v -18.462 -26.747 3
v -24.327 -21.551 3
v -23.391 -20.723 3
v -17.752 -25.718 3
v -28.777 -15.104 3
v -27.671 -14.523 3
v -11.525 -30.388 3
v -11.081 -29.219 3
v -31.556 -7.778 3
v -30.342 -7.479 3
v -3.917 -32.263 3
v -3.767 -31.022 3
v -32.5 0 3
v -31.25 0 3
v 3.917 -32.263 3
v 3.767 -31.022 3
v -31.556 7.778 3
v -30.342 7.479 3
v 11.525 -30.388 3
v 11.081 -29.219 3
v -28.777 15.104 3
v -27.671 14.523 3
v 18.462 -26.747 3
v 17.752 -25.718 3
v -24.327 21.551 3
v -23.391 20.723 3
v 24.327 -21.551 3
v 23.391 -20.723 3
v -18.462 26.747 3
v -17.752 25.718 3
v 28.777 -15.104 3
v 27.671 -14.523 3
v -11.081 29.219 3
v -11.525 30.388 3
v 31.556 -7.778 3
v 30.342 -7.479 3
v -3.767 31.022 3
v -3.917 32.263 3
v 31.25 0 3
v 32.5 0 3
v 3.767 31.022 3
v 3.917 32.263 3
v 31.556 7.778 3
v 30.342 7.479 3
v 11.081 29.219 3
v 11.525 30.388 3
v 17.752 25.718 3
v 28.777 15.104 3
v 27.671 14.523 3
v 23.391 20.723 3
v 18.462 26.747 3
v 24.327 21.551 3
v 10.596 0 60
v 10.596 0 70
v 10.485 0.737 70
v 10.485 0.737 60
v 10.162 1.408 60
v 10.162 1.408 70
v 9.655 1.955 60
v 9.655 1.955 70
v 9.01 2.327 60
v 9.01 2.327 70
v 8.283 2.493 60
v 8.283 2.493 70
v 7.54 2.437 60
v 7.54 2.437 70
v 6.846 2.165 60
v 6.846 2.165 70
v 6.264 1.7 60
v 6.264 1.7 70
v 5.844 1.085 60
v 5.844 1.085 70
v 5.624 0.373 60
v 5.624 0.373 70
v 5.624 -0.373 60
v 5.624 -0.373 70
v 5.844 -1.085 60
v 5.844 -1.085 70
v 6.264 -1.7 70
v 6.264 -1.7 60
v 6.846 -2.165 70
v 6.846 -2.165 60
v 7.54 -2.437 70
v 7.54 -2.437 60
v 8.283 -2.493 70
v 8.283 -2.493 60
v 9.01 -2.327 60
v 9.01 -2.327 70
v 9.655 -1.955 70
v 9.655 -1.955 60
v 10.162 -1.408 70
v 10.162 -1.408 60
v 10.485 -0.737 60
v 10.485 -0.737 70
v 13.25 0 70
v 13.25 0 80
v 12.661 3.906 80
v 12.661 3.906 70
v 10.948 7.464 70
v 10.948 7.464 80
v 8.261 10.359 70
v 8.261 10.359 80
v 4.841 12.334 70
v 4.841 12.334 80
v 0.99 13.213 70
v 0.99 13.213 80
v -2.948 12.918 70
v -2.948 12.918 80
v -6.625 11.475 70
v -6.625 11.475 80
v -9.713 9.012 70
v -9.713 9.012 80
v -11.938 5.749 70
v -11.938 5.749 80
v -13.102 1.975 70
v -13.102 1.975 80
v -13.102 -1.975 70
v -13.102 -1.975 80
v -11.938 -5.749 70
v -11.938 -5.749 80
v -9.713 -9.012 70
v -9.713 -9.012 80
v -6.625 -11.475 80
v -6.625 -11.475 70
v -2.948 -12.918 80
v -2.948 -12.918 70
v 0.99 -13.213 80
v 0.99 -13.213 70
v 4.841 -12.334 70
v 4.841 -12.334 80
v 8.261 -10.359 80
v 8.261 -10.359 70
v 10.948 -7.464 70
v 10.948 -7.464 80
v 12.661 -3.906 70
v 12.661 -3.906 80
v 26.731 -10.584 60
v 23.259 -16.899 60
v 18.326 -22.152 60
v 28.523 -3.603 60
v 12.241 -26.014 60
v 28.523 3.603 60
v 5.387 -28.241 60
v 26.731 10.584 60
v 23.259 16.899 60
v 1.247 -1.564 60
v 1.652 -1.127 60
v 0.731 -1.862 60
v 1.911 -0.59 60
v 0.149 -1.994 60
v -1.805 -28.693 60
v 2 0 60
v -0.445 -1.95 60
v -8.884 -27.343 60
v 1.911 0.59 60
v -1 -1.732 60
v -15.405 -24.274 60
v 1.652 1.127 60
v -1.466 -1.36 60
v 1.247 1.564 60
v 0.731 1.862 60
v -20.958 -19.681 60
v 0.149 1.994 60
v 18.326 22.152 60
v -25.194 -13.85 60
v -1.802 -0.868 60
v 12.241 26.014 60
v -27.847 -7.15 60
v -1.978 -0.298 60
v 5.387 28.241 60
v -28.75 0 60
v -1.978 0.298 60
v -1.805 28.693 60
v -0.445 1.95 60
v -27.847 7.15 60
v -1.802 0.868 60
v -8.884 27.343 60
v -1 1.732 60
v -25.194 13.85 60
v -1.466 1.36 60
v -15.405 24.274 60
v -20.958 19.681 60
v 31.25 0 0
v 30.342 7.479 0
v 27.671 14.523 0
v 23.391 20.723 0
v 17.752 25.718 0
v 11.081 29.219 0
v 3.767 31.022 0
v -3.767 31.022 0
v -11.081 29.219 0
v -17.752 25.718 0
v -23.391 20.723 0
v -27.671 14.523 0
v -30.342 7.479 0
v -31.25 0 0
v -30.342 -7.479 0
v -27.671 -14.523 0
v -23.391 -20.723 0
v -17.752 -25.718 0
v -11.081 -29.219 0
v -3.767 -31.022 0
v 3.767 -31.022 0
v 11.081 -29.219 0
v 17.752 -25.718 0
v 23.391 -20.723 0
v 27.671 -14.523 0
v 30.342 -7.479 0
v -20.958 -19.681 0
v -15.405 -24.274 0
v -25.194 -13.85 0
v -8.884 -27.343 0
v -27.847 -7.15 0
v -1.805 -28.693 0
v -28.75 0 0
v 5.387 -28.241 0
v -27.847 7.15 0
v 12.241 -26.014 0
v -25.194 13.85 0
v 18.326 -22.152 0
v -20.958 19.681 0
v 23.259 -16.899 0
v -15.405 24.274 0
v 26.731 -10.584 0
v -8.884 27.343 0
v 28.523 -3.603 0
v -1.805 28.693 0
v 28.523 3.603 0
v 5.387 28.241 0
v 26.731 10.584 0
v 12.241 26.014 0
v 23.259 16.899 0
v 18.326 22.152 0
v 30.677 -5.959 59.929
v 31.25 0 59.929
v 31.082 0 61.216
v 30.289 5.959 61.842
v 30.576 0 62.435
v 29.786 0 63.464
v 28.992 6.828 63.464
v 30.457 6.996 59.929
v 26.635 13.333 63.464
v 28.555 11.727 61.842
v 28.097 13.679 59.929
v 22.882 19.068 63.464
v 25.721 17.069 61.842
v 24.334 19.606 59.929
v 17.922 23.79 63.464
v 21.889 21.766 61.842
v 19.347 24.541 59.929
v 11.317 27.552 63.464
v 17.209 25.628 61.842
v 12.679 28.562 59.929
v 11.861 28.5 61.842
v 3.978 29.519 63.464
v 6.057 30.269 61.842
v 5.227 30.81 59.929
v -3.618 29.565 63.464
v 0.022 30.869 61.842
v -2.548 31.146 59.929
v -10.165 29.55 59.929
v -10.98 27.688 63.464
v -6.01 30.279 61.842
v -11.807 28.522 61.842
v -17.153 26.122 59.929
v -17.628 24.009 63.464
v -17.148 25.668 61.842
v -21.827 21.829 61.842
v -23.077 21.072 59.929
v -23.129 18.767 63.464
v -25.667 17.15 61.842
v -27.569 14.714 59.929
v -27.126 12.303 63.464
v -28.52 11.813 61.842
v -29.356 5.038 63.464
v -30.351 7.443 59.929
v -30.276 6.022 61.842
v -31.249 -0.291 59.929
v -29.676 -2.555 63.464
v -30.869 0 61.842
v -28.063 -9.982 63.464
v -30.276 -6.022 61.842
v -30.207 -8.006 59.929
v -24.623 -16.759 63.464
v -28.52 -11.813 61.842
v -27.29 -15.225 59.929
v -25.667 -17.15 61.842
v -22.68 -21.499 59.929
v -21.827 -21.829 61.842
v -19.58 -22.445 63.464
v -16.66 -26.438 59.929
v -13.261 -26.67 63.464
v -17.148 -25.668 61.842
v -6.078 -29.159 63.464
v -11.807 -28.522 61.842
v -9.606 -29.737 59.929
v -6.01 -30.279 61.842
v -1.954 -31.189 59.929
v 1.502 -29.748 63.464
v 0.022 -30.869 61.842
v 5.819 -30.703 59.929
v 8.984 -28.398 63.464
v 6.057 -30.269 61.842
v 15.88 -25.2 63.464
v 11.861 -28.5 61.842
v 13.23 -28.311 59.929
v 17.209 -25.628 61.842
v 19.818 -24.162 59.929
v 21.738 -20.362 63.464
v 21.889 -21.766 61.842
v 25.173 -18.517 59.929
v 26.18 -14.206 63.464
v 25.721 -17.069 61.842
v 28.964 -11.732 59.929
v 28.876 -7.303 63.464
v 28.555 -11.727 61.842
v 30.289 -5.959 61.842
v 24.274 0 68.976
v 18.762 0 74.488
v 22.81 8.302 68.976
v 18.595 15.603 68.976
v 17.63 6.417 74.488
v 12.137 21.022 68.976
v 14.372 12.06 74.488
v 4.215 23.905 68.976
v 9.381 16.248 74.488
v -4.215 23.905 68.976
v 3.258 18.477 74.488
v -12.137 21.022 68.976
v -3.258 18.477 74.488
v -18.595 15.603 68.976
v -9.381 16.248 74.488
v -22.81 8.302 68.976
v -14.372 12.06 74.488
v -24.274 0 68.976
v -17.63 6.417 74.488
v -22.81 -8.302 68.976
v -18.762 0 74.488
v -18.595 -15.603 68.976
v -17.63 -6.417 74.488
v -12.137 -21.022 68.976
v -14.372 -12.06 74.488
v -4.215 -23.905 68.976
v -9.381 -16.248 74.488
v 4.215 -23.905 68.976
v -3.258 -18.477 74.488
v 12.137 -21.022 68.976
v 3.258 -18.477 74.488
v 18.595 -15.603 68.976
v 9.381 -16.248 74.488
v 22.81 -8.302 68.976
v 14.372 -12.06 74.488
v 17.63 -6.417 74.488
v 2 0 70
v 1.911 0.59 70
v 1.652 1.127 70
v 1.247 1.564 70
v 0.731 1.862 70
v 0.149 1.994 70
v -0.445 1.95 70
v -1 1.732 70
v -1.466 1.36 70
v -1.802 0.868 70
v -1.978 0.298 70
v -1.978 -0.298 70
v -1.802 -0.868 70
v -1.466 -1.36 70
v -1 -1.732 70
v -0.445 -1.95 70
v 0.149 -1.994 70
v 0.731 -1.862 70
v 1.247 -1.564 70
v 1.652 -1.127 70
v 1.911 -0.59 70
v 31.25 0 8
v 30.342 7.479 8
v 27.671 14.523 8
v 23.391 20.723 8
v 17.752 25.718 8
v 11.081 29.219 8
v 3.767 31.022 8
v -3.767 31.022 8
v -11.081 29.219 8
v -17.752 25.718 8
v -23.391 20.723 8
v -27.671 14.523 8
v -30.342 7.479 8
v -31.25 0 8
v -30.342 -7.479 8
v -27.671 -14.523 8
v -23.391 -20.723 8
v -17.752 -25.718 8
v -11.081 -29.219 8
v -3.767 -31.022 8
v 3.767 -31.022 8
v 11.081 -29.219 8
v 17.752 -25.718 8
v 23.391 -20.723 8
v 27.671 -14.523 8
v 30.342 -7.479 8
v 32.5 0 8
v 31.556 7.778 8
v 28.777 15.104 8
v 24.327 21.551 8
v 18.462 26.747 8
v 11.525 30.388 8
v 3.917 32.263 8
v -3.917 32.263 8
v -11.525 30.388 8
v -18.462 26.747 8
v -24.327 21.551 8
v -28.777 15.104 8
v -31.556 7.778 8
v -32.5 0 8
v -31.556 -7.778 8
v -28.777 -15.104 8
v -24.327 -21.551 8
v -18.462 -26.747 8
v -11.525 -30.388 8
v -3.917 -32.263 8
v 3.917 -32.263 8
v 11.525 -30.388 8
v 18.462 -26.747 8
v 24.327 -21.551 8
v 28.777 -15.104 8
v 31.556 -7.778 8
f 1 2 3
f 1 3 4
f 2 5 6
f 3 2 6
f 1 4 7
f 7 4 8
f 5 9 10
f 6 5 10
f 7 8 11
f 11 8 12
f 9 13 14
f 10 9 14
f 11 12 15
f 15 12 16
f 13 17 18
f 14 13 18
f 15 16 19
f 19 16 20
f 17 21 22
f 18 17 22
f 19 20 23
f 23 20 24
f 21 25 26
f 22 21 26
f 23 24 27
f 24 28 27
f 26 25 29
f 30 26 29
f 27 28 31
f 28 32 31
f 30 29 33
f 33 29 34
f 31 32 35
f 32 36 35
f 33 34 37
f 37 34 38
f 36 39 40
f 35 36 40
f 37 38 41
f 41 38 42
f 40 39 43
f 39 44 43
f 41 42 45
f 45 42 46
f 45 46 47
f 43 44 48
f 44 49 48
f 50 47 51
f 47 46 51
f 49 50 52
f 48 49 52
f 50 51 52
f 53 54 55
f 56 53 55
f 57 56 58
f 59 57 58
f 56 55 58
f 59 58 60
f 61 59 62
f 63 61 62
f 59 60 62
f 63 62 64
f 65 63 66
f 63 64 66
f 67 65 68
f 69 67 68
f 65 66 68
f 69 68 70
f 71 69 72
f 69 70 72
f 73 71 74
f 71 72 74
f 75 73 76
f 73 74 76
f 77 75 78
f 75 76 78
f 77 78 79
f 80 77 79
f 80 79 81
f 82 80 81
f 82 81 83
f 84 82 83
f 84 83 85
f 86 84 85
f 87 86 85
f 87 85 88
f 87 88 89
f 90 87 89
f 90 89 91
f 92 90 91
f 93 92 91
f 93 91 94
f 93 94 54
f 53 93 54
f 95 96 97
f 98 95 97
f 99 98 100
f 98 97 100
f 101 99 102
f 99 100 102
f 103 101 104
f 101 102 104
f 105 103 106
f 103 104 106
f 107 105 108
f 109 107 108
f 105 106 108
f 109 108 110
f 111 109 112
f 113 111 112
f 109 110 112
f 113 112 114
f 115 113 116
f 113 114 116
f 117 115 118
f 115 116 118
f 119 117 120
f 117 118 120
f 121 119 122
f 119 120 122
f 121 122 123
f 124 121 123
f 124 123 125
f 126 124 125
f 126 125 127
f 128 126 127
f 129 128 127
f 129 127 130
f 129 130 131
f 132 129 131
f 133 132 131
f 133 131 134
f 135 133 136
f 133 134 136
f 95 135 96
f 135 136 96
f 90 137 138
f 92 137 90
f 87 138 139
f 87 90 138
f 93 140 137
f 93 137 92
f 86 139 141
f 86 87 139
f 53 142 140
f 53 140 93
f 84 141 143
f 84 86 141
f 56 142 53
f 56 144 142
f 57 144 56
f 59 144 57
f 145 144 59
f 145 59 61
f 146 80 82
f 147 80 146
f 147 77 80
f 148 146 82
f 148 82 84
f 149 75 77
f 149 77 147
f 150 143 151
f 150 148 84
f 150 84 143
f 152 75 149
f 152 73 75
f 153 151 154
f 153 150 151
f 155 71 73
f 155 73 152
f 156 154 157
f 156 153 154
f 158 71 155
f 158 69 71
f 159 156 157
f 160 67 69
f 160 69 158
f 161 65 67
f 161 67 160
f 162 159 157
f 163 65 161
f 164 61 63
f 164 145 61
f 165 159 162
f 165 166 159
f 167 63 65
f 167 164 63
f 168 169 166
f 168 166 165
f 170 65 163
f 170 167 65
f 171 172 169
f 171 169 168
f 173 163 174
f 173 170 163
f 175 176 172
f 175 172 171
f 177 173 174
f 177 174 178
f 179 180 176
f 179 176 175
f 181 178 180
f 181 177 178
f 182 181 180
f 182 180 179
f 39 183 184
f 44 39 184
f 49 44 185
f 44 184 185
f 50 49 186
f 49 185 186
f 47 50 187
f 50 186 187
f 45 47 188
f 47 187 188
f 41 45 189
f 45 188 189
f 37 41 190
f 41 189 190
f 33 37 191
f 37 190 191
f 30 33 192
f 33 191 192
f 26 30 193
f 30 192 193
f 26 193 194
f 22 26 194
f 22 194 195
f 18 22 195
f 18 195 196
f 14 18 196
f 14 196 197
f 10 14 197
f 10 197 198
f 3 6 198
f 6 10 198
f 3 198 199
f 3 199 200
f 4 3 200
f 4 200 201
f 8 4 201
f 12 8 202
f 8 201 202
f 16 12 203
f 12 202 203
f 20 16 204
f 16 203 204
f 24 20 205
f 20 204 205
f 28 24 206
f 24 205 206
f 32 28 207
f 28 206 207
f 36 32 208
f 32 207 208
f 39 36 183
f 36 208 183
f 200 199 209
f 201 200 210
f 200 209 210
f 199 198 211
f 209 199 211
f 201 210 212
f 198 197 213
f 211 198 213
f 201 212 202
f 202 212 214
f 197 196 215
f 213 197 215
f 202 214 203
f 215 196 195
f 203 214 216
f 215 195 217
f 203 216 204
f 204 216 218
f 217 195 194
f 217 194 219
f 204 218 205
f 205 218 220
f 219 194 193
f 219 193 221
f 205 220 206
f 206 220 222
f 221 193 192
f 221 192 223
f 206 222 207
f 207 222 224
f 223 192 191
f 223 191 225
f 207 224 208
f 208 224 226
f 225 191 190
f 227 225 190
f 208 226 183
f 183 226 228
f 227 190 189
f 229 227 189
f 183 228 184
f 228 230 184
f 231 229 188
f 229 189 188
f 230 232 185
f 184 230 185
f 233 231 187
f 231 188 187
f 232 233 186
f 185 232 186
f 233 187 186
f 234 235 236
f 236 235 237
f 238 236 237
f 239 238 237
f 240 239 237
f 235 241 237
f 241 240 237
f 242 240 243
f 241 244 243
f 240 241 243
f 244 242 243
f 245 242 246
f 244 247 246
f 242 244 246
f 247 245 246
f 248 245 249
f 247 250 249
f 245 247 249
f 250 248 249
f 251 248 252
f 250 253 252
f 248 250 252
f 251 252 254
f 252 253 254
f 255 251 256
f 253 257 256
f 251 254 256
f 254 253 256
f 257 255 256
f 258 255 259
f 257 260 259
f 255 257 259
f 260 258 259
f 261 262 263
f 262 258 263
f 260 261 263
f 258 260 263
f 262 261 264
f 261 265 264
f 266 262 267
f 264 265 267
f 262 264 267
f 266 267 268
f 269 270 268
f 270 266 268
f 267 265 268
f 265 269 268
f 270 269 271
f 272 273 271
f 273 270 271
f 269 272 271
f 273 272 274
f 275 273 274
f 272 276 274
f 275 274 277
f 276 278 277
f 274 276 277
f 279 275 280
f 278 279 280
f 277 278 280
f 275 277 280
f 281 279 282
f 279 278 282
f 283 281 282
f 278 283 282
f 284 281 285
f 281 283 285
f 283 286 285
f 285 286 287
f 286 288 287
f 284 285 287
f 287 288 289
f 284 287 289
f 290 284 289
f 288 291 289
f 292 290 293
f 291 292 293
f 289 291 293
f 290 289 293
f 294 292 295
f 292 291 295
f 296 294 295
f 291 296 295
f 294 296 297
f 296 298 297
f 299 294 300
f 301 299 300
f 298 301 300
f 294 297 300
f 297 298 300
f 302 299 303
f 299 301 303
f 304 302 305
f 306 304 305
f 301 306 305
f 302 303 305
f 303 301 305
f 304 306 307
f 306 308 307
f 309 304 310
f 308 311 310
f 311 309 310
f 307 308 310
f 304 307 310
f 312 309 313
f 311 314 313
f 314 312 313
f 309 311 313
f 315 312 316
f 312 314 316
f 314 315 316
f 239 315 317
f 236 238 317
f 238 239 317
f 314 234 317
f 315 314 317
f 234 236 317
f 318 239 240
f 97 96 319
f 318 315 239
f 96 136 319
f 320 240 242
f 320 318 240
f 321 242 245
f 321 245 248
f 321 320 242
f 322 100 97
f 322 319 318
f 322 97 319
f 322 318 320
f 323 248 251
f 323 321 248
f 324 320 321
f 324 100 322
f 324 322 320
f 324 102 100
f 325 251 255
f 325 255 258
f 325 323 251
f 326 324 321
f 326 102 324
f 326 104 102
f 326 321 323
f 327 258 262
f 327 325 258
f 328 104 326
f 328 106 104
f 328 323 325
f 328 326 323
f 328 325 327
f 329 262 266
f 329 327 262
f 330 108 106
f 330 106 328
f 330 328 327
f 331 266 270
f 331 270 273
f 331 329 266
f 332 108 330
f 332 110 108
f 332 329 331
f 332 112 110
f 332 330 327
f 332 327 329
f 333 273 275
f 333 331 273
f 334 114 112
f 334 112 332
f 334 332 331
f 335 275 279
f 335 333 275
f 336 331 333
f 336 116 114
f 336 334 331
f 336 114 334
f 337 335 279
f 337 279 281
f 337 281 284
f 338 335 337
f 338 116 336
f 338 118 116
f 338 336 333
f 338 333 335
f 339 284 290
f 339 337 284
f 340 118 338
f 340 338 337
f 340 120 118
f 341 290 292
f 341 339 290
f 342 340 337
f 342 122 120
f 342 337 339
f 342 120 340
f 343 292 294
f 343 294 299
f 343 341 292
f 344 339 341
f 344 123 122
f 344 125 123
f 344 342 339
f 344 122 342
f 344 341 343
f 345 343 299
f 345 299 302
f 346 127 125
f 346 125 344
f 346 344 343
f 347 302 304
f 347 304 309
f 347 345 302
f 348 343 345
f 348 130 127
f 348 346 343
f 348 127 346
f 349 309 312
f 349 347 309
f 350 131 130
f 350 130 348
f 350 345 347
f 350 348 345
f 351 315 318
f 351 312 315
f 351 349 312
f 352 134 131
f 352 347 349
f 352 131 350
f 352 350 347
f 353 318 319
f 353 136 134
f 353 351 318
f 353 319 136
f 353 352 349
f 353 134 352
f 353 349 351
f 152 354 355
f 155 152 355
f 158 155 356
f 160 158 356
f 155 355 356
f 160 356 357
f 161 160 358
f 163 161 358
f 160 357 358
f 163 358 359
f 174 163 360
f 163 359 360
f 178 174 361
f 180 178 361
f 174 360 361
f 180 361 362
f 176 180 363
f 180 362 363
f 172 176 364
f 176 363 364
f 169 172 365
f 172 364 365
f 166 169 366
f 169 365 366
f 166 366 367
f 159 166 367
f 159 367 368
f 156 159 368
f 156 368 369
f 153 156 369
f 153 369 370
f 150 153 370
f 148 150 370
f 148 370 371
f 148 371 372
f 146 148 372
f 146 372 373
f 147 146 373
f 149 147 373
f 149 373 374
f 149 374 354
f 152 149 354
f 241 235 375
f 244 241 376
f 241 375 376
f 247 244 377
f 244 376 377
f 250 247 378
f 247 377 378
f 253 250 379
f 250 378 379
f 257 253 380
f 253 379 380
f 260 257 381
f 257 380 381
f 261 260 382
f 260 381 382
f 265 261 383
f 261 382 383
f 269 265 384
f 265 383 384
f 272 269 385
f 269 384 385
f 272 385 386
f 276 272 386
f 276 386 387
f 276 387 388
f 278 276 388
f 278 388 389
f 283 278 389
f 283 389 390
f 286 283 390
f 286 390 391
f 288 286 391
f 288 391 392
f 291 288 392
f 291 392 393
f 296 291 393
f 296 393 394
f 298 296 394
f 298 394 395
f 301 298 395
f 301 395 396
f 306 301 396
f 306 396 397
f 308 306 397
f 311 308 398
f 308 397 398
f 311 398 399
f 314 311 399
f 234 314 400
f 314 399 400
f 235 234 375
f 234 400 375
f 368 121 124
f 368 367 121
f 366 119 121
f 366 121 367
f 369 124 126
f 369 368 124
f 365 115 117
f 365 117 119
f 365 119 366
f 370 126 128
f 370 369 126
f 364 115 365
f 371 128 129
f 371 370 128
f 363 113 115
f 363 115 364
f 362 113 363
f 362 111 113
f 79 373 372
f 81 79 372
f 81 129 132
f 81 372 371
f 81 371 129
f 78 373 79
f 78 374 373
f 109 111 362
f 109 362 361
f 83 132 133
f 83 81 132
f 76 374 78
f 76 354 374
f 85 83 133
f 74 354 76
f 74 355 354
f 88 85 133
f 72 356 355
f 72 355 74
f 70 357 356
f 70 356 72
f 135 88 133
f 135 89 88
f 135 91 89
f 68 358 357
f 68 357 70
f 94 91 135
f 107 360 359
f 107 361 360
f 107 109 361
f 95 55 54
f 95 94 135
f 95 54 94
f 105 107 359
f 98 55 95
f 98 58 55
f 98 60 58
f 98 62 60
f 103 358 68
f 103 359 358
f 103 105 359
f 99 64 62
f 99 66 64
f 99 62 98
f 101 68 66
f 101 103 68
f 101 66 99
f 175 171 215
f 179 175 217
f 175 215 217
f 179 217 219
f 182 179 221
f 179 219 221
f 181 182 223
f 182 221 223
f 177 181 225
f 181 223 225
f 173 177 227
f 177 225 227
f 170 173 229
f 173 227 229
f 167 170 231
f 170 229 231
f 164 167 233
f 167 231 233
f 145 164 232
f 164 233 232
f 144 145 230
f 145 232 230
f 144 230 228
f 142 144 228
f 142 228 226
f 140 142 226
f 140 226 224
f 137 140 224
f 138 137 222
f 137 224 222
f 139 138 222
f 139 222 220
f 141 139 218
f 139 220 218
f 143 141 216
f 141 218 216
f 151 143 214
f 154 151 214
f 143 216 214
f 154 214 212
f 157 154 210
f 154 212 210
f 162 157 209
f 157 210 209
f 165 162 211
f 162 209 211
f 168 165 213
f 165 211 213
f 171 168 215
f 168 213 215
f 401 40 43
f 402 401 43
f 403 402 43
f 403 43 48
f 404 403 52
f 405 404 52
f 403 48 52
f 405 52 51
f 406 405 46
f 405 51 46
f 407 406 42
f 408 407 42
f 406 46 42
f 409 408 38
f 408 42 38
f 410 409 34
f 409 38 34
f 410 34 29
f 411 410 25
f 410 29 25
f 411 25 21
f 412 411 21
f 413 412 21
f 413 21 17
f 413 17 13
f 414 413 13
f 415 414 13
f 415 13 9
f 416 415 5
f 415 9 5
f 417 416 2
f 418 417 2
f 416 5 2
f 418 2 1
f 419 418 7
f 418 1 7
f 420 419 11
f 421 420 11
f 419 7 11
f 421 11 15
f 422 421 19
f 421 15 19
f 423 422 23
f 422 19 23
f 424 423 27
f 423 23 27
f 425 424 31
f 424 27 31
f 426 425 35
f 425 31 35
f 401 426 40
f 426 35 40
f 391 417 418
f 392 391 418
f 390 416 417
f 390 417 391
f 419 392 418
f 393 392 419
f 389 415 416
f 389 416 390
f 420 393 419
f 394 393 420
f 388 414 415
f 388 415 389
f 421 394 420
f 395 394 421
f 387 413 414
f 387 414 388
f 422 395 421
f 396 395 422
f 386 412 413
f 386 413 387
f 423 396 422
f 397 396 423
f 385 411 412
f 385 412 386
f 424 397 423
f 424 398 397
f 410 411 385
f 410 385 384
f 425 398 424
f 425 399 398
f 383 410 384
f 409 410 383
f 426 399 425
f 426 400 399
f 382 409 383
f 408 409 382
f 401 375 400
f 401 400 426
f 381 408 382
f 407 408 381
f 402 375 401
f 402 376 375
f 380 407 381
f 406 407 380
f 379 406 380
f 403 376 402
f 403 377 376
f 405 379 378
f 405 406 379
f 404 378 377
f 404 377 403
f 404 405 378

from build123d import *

# Parameters (mm, degrees)
SKETCH1_R           = 31.25
BOSS_EXTRUDE1_DEPTH = 80
SKETCH2_R           = 32.5
BOSS_EXTRUDE2_DEPTH = 5
CHAMFER1_SIZE       = 18
FILLET2_R           = 5
SKETCH6_R           = 13.25
CUT_EXTRUDE3_DEPTH  = 10
SKETCH7_R           = 28.75
CUT_EXTRUDE4_DEPTH  = 60
SKETCH8_R           = 2
SKETCH8_R_2         = 2.5
CUT_EXTRUDE5_DEPTH  = 84.740671122


with BuildPart() as part:
    # Sketch1 → Boss-Extrude1 (new body)
    with BuildSketch(Plane.XY):
        Circle(SKETCH1_R)
    extrude(amount=BOSS_EXTRUDE1_DEPTH)

    # Sketch2 → Boss-Extrude2 (add)
    with BuildSketch(Plane.XY.offset(3)):
        Circle(SKETCH2_R)
    extrude(amount=BOSS_EXTRUDE2_DEPTH)

    # Chamfer1
    chamfer1_edges = [part.edges().sort_by_distance(p)[0] for p in [
        (-31.25, 0, 80),
    ]]
    chamfer(chamfer1_edges, length=CHAMFER1_SIZE)

    # Fillet2
    fillet2_edges = [part.edges().sort_by_distance(p)[0] for p in [
        (-31.25, 0, 62),
    ]]
    fillet(fillet2_edges, radius=FILLET2_R)

    # Sketch6 → Cut-Extrude3 (cut)
    with BuildSketch(Plane.XY.offset(80)):
        Circle(SKETCH6_R)
    extrude(amount=-CUT_EXTRUDE3_DEPTH, mode=Mode.SUBTRACT)

    # Sketch7 → Cut-Extrude4 (cut)
    with BuildSketch(Plane(origin=(0, 0, 0), x_dir=(-1, 0, 0), z_dir=(0, 0, -1))):
        Circle(SKETCH7_R)
    extrude(amount=-CUT_EXTRUDE4_DEPTH, mode=Mode.SUBTRACT)

    # Sketch8 → Cut-Extrude5 (cut, through all)
    with BuildSketch(Plane.XY.offset(70)):
        Circle(SKETCH8_R)
        with Locations((8.096346775, 0)):
            Circle(SKETCH8_R_2)
    extrude(amount=-CUT_EXTRUDE5_DEPTH, mode=Mode.SUBTRACT)


solid = part.part
